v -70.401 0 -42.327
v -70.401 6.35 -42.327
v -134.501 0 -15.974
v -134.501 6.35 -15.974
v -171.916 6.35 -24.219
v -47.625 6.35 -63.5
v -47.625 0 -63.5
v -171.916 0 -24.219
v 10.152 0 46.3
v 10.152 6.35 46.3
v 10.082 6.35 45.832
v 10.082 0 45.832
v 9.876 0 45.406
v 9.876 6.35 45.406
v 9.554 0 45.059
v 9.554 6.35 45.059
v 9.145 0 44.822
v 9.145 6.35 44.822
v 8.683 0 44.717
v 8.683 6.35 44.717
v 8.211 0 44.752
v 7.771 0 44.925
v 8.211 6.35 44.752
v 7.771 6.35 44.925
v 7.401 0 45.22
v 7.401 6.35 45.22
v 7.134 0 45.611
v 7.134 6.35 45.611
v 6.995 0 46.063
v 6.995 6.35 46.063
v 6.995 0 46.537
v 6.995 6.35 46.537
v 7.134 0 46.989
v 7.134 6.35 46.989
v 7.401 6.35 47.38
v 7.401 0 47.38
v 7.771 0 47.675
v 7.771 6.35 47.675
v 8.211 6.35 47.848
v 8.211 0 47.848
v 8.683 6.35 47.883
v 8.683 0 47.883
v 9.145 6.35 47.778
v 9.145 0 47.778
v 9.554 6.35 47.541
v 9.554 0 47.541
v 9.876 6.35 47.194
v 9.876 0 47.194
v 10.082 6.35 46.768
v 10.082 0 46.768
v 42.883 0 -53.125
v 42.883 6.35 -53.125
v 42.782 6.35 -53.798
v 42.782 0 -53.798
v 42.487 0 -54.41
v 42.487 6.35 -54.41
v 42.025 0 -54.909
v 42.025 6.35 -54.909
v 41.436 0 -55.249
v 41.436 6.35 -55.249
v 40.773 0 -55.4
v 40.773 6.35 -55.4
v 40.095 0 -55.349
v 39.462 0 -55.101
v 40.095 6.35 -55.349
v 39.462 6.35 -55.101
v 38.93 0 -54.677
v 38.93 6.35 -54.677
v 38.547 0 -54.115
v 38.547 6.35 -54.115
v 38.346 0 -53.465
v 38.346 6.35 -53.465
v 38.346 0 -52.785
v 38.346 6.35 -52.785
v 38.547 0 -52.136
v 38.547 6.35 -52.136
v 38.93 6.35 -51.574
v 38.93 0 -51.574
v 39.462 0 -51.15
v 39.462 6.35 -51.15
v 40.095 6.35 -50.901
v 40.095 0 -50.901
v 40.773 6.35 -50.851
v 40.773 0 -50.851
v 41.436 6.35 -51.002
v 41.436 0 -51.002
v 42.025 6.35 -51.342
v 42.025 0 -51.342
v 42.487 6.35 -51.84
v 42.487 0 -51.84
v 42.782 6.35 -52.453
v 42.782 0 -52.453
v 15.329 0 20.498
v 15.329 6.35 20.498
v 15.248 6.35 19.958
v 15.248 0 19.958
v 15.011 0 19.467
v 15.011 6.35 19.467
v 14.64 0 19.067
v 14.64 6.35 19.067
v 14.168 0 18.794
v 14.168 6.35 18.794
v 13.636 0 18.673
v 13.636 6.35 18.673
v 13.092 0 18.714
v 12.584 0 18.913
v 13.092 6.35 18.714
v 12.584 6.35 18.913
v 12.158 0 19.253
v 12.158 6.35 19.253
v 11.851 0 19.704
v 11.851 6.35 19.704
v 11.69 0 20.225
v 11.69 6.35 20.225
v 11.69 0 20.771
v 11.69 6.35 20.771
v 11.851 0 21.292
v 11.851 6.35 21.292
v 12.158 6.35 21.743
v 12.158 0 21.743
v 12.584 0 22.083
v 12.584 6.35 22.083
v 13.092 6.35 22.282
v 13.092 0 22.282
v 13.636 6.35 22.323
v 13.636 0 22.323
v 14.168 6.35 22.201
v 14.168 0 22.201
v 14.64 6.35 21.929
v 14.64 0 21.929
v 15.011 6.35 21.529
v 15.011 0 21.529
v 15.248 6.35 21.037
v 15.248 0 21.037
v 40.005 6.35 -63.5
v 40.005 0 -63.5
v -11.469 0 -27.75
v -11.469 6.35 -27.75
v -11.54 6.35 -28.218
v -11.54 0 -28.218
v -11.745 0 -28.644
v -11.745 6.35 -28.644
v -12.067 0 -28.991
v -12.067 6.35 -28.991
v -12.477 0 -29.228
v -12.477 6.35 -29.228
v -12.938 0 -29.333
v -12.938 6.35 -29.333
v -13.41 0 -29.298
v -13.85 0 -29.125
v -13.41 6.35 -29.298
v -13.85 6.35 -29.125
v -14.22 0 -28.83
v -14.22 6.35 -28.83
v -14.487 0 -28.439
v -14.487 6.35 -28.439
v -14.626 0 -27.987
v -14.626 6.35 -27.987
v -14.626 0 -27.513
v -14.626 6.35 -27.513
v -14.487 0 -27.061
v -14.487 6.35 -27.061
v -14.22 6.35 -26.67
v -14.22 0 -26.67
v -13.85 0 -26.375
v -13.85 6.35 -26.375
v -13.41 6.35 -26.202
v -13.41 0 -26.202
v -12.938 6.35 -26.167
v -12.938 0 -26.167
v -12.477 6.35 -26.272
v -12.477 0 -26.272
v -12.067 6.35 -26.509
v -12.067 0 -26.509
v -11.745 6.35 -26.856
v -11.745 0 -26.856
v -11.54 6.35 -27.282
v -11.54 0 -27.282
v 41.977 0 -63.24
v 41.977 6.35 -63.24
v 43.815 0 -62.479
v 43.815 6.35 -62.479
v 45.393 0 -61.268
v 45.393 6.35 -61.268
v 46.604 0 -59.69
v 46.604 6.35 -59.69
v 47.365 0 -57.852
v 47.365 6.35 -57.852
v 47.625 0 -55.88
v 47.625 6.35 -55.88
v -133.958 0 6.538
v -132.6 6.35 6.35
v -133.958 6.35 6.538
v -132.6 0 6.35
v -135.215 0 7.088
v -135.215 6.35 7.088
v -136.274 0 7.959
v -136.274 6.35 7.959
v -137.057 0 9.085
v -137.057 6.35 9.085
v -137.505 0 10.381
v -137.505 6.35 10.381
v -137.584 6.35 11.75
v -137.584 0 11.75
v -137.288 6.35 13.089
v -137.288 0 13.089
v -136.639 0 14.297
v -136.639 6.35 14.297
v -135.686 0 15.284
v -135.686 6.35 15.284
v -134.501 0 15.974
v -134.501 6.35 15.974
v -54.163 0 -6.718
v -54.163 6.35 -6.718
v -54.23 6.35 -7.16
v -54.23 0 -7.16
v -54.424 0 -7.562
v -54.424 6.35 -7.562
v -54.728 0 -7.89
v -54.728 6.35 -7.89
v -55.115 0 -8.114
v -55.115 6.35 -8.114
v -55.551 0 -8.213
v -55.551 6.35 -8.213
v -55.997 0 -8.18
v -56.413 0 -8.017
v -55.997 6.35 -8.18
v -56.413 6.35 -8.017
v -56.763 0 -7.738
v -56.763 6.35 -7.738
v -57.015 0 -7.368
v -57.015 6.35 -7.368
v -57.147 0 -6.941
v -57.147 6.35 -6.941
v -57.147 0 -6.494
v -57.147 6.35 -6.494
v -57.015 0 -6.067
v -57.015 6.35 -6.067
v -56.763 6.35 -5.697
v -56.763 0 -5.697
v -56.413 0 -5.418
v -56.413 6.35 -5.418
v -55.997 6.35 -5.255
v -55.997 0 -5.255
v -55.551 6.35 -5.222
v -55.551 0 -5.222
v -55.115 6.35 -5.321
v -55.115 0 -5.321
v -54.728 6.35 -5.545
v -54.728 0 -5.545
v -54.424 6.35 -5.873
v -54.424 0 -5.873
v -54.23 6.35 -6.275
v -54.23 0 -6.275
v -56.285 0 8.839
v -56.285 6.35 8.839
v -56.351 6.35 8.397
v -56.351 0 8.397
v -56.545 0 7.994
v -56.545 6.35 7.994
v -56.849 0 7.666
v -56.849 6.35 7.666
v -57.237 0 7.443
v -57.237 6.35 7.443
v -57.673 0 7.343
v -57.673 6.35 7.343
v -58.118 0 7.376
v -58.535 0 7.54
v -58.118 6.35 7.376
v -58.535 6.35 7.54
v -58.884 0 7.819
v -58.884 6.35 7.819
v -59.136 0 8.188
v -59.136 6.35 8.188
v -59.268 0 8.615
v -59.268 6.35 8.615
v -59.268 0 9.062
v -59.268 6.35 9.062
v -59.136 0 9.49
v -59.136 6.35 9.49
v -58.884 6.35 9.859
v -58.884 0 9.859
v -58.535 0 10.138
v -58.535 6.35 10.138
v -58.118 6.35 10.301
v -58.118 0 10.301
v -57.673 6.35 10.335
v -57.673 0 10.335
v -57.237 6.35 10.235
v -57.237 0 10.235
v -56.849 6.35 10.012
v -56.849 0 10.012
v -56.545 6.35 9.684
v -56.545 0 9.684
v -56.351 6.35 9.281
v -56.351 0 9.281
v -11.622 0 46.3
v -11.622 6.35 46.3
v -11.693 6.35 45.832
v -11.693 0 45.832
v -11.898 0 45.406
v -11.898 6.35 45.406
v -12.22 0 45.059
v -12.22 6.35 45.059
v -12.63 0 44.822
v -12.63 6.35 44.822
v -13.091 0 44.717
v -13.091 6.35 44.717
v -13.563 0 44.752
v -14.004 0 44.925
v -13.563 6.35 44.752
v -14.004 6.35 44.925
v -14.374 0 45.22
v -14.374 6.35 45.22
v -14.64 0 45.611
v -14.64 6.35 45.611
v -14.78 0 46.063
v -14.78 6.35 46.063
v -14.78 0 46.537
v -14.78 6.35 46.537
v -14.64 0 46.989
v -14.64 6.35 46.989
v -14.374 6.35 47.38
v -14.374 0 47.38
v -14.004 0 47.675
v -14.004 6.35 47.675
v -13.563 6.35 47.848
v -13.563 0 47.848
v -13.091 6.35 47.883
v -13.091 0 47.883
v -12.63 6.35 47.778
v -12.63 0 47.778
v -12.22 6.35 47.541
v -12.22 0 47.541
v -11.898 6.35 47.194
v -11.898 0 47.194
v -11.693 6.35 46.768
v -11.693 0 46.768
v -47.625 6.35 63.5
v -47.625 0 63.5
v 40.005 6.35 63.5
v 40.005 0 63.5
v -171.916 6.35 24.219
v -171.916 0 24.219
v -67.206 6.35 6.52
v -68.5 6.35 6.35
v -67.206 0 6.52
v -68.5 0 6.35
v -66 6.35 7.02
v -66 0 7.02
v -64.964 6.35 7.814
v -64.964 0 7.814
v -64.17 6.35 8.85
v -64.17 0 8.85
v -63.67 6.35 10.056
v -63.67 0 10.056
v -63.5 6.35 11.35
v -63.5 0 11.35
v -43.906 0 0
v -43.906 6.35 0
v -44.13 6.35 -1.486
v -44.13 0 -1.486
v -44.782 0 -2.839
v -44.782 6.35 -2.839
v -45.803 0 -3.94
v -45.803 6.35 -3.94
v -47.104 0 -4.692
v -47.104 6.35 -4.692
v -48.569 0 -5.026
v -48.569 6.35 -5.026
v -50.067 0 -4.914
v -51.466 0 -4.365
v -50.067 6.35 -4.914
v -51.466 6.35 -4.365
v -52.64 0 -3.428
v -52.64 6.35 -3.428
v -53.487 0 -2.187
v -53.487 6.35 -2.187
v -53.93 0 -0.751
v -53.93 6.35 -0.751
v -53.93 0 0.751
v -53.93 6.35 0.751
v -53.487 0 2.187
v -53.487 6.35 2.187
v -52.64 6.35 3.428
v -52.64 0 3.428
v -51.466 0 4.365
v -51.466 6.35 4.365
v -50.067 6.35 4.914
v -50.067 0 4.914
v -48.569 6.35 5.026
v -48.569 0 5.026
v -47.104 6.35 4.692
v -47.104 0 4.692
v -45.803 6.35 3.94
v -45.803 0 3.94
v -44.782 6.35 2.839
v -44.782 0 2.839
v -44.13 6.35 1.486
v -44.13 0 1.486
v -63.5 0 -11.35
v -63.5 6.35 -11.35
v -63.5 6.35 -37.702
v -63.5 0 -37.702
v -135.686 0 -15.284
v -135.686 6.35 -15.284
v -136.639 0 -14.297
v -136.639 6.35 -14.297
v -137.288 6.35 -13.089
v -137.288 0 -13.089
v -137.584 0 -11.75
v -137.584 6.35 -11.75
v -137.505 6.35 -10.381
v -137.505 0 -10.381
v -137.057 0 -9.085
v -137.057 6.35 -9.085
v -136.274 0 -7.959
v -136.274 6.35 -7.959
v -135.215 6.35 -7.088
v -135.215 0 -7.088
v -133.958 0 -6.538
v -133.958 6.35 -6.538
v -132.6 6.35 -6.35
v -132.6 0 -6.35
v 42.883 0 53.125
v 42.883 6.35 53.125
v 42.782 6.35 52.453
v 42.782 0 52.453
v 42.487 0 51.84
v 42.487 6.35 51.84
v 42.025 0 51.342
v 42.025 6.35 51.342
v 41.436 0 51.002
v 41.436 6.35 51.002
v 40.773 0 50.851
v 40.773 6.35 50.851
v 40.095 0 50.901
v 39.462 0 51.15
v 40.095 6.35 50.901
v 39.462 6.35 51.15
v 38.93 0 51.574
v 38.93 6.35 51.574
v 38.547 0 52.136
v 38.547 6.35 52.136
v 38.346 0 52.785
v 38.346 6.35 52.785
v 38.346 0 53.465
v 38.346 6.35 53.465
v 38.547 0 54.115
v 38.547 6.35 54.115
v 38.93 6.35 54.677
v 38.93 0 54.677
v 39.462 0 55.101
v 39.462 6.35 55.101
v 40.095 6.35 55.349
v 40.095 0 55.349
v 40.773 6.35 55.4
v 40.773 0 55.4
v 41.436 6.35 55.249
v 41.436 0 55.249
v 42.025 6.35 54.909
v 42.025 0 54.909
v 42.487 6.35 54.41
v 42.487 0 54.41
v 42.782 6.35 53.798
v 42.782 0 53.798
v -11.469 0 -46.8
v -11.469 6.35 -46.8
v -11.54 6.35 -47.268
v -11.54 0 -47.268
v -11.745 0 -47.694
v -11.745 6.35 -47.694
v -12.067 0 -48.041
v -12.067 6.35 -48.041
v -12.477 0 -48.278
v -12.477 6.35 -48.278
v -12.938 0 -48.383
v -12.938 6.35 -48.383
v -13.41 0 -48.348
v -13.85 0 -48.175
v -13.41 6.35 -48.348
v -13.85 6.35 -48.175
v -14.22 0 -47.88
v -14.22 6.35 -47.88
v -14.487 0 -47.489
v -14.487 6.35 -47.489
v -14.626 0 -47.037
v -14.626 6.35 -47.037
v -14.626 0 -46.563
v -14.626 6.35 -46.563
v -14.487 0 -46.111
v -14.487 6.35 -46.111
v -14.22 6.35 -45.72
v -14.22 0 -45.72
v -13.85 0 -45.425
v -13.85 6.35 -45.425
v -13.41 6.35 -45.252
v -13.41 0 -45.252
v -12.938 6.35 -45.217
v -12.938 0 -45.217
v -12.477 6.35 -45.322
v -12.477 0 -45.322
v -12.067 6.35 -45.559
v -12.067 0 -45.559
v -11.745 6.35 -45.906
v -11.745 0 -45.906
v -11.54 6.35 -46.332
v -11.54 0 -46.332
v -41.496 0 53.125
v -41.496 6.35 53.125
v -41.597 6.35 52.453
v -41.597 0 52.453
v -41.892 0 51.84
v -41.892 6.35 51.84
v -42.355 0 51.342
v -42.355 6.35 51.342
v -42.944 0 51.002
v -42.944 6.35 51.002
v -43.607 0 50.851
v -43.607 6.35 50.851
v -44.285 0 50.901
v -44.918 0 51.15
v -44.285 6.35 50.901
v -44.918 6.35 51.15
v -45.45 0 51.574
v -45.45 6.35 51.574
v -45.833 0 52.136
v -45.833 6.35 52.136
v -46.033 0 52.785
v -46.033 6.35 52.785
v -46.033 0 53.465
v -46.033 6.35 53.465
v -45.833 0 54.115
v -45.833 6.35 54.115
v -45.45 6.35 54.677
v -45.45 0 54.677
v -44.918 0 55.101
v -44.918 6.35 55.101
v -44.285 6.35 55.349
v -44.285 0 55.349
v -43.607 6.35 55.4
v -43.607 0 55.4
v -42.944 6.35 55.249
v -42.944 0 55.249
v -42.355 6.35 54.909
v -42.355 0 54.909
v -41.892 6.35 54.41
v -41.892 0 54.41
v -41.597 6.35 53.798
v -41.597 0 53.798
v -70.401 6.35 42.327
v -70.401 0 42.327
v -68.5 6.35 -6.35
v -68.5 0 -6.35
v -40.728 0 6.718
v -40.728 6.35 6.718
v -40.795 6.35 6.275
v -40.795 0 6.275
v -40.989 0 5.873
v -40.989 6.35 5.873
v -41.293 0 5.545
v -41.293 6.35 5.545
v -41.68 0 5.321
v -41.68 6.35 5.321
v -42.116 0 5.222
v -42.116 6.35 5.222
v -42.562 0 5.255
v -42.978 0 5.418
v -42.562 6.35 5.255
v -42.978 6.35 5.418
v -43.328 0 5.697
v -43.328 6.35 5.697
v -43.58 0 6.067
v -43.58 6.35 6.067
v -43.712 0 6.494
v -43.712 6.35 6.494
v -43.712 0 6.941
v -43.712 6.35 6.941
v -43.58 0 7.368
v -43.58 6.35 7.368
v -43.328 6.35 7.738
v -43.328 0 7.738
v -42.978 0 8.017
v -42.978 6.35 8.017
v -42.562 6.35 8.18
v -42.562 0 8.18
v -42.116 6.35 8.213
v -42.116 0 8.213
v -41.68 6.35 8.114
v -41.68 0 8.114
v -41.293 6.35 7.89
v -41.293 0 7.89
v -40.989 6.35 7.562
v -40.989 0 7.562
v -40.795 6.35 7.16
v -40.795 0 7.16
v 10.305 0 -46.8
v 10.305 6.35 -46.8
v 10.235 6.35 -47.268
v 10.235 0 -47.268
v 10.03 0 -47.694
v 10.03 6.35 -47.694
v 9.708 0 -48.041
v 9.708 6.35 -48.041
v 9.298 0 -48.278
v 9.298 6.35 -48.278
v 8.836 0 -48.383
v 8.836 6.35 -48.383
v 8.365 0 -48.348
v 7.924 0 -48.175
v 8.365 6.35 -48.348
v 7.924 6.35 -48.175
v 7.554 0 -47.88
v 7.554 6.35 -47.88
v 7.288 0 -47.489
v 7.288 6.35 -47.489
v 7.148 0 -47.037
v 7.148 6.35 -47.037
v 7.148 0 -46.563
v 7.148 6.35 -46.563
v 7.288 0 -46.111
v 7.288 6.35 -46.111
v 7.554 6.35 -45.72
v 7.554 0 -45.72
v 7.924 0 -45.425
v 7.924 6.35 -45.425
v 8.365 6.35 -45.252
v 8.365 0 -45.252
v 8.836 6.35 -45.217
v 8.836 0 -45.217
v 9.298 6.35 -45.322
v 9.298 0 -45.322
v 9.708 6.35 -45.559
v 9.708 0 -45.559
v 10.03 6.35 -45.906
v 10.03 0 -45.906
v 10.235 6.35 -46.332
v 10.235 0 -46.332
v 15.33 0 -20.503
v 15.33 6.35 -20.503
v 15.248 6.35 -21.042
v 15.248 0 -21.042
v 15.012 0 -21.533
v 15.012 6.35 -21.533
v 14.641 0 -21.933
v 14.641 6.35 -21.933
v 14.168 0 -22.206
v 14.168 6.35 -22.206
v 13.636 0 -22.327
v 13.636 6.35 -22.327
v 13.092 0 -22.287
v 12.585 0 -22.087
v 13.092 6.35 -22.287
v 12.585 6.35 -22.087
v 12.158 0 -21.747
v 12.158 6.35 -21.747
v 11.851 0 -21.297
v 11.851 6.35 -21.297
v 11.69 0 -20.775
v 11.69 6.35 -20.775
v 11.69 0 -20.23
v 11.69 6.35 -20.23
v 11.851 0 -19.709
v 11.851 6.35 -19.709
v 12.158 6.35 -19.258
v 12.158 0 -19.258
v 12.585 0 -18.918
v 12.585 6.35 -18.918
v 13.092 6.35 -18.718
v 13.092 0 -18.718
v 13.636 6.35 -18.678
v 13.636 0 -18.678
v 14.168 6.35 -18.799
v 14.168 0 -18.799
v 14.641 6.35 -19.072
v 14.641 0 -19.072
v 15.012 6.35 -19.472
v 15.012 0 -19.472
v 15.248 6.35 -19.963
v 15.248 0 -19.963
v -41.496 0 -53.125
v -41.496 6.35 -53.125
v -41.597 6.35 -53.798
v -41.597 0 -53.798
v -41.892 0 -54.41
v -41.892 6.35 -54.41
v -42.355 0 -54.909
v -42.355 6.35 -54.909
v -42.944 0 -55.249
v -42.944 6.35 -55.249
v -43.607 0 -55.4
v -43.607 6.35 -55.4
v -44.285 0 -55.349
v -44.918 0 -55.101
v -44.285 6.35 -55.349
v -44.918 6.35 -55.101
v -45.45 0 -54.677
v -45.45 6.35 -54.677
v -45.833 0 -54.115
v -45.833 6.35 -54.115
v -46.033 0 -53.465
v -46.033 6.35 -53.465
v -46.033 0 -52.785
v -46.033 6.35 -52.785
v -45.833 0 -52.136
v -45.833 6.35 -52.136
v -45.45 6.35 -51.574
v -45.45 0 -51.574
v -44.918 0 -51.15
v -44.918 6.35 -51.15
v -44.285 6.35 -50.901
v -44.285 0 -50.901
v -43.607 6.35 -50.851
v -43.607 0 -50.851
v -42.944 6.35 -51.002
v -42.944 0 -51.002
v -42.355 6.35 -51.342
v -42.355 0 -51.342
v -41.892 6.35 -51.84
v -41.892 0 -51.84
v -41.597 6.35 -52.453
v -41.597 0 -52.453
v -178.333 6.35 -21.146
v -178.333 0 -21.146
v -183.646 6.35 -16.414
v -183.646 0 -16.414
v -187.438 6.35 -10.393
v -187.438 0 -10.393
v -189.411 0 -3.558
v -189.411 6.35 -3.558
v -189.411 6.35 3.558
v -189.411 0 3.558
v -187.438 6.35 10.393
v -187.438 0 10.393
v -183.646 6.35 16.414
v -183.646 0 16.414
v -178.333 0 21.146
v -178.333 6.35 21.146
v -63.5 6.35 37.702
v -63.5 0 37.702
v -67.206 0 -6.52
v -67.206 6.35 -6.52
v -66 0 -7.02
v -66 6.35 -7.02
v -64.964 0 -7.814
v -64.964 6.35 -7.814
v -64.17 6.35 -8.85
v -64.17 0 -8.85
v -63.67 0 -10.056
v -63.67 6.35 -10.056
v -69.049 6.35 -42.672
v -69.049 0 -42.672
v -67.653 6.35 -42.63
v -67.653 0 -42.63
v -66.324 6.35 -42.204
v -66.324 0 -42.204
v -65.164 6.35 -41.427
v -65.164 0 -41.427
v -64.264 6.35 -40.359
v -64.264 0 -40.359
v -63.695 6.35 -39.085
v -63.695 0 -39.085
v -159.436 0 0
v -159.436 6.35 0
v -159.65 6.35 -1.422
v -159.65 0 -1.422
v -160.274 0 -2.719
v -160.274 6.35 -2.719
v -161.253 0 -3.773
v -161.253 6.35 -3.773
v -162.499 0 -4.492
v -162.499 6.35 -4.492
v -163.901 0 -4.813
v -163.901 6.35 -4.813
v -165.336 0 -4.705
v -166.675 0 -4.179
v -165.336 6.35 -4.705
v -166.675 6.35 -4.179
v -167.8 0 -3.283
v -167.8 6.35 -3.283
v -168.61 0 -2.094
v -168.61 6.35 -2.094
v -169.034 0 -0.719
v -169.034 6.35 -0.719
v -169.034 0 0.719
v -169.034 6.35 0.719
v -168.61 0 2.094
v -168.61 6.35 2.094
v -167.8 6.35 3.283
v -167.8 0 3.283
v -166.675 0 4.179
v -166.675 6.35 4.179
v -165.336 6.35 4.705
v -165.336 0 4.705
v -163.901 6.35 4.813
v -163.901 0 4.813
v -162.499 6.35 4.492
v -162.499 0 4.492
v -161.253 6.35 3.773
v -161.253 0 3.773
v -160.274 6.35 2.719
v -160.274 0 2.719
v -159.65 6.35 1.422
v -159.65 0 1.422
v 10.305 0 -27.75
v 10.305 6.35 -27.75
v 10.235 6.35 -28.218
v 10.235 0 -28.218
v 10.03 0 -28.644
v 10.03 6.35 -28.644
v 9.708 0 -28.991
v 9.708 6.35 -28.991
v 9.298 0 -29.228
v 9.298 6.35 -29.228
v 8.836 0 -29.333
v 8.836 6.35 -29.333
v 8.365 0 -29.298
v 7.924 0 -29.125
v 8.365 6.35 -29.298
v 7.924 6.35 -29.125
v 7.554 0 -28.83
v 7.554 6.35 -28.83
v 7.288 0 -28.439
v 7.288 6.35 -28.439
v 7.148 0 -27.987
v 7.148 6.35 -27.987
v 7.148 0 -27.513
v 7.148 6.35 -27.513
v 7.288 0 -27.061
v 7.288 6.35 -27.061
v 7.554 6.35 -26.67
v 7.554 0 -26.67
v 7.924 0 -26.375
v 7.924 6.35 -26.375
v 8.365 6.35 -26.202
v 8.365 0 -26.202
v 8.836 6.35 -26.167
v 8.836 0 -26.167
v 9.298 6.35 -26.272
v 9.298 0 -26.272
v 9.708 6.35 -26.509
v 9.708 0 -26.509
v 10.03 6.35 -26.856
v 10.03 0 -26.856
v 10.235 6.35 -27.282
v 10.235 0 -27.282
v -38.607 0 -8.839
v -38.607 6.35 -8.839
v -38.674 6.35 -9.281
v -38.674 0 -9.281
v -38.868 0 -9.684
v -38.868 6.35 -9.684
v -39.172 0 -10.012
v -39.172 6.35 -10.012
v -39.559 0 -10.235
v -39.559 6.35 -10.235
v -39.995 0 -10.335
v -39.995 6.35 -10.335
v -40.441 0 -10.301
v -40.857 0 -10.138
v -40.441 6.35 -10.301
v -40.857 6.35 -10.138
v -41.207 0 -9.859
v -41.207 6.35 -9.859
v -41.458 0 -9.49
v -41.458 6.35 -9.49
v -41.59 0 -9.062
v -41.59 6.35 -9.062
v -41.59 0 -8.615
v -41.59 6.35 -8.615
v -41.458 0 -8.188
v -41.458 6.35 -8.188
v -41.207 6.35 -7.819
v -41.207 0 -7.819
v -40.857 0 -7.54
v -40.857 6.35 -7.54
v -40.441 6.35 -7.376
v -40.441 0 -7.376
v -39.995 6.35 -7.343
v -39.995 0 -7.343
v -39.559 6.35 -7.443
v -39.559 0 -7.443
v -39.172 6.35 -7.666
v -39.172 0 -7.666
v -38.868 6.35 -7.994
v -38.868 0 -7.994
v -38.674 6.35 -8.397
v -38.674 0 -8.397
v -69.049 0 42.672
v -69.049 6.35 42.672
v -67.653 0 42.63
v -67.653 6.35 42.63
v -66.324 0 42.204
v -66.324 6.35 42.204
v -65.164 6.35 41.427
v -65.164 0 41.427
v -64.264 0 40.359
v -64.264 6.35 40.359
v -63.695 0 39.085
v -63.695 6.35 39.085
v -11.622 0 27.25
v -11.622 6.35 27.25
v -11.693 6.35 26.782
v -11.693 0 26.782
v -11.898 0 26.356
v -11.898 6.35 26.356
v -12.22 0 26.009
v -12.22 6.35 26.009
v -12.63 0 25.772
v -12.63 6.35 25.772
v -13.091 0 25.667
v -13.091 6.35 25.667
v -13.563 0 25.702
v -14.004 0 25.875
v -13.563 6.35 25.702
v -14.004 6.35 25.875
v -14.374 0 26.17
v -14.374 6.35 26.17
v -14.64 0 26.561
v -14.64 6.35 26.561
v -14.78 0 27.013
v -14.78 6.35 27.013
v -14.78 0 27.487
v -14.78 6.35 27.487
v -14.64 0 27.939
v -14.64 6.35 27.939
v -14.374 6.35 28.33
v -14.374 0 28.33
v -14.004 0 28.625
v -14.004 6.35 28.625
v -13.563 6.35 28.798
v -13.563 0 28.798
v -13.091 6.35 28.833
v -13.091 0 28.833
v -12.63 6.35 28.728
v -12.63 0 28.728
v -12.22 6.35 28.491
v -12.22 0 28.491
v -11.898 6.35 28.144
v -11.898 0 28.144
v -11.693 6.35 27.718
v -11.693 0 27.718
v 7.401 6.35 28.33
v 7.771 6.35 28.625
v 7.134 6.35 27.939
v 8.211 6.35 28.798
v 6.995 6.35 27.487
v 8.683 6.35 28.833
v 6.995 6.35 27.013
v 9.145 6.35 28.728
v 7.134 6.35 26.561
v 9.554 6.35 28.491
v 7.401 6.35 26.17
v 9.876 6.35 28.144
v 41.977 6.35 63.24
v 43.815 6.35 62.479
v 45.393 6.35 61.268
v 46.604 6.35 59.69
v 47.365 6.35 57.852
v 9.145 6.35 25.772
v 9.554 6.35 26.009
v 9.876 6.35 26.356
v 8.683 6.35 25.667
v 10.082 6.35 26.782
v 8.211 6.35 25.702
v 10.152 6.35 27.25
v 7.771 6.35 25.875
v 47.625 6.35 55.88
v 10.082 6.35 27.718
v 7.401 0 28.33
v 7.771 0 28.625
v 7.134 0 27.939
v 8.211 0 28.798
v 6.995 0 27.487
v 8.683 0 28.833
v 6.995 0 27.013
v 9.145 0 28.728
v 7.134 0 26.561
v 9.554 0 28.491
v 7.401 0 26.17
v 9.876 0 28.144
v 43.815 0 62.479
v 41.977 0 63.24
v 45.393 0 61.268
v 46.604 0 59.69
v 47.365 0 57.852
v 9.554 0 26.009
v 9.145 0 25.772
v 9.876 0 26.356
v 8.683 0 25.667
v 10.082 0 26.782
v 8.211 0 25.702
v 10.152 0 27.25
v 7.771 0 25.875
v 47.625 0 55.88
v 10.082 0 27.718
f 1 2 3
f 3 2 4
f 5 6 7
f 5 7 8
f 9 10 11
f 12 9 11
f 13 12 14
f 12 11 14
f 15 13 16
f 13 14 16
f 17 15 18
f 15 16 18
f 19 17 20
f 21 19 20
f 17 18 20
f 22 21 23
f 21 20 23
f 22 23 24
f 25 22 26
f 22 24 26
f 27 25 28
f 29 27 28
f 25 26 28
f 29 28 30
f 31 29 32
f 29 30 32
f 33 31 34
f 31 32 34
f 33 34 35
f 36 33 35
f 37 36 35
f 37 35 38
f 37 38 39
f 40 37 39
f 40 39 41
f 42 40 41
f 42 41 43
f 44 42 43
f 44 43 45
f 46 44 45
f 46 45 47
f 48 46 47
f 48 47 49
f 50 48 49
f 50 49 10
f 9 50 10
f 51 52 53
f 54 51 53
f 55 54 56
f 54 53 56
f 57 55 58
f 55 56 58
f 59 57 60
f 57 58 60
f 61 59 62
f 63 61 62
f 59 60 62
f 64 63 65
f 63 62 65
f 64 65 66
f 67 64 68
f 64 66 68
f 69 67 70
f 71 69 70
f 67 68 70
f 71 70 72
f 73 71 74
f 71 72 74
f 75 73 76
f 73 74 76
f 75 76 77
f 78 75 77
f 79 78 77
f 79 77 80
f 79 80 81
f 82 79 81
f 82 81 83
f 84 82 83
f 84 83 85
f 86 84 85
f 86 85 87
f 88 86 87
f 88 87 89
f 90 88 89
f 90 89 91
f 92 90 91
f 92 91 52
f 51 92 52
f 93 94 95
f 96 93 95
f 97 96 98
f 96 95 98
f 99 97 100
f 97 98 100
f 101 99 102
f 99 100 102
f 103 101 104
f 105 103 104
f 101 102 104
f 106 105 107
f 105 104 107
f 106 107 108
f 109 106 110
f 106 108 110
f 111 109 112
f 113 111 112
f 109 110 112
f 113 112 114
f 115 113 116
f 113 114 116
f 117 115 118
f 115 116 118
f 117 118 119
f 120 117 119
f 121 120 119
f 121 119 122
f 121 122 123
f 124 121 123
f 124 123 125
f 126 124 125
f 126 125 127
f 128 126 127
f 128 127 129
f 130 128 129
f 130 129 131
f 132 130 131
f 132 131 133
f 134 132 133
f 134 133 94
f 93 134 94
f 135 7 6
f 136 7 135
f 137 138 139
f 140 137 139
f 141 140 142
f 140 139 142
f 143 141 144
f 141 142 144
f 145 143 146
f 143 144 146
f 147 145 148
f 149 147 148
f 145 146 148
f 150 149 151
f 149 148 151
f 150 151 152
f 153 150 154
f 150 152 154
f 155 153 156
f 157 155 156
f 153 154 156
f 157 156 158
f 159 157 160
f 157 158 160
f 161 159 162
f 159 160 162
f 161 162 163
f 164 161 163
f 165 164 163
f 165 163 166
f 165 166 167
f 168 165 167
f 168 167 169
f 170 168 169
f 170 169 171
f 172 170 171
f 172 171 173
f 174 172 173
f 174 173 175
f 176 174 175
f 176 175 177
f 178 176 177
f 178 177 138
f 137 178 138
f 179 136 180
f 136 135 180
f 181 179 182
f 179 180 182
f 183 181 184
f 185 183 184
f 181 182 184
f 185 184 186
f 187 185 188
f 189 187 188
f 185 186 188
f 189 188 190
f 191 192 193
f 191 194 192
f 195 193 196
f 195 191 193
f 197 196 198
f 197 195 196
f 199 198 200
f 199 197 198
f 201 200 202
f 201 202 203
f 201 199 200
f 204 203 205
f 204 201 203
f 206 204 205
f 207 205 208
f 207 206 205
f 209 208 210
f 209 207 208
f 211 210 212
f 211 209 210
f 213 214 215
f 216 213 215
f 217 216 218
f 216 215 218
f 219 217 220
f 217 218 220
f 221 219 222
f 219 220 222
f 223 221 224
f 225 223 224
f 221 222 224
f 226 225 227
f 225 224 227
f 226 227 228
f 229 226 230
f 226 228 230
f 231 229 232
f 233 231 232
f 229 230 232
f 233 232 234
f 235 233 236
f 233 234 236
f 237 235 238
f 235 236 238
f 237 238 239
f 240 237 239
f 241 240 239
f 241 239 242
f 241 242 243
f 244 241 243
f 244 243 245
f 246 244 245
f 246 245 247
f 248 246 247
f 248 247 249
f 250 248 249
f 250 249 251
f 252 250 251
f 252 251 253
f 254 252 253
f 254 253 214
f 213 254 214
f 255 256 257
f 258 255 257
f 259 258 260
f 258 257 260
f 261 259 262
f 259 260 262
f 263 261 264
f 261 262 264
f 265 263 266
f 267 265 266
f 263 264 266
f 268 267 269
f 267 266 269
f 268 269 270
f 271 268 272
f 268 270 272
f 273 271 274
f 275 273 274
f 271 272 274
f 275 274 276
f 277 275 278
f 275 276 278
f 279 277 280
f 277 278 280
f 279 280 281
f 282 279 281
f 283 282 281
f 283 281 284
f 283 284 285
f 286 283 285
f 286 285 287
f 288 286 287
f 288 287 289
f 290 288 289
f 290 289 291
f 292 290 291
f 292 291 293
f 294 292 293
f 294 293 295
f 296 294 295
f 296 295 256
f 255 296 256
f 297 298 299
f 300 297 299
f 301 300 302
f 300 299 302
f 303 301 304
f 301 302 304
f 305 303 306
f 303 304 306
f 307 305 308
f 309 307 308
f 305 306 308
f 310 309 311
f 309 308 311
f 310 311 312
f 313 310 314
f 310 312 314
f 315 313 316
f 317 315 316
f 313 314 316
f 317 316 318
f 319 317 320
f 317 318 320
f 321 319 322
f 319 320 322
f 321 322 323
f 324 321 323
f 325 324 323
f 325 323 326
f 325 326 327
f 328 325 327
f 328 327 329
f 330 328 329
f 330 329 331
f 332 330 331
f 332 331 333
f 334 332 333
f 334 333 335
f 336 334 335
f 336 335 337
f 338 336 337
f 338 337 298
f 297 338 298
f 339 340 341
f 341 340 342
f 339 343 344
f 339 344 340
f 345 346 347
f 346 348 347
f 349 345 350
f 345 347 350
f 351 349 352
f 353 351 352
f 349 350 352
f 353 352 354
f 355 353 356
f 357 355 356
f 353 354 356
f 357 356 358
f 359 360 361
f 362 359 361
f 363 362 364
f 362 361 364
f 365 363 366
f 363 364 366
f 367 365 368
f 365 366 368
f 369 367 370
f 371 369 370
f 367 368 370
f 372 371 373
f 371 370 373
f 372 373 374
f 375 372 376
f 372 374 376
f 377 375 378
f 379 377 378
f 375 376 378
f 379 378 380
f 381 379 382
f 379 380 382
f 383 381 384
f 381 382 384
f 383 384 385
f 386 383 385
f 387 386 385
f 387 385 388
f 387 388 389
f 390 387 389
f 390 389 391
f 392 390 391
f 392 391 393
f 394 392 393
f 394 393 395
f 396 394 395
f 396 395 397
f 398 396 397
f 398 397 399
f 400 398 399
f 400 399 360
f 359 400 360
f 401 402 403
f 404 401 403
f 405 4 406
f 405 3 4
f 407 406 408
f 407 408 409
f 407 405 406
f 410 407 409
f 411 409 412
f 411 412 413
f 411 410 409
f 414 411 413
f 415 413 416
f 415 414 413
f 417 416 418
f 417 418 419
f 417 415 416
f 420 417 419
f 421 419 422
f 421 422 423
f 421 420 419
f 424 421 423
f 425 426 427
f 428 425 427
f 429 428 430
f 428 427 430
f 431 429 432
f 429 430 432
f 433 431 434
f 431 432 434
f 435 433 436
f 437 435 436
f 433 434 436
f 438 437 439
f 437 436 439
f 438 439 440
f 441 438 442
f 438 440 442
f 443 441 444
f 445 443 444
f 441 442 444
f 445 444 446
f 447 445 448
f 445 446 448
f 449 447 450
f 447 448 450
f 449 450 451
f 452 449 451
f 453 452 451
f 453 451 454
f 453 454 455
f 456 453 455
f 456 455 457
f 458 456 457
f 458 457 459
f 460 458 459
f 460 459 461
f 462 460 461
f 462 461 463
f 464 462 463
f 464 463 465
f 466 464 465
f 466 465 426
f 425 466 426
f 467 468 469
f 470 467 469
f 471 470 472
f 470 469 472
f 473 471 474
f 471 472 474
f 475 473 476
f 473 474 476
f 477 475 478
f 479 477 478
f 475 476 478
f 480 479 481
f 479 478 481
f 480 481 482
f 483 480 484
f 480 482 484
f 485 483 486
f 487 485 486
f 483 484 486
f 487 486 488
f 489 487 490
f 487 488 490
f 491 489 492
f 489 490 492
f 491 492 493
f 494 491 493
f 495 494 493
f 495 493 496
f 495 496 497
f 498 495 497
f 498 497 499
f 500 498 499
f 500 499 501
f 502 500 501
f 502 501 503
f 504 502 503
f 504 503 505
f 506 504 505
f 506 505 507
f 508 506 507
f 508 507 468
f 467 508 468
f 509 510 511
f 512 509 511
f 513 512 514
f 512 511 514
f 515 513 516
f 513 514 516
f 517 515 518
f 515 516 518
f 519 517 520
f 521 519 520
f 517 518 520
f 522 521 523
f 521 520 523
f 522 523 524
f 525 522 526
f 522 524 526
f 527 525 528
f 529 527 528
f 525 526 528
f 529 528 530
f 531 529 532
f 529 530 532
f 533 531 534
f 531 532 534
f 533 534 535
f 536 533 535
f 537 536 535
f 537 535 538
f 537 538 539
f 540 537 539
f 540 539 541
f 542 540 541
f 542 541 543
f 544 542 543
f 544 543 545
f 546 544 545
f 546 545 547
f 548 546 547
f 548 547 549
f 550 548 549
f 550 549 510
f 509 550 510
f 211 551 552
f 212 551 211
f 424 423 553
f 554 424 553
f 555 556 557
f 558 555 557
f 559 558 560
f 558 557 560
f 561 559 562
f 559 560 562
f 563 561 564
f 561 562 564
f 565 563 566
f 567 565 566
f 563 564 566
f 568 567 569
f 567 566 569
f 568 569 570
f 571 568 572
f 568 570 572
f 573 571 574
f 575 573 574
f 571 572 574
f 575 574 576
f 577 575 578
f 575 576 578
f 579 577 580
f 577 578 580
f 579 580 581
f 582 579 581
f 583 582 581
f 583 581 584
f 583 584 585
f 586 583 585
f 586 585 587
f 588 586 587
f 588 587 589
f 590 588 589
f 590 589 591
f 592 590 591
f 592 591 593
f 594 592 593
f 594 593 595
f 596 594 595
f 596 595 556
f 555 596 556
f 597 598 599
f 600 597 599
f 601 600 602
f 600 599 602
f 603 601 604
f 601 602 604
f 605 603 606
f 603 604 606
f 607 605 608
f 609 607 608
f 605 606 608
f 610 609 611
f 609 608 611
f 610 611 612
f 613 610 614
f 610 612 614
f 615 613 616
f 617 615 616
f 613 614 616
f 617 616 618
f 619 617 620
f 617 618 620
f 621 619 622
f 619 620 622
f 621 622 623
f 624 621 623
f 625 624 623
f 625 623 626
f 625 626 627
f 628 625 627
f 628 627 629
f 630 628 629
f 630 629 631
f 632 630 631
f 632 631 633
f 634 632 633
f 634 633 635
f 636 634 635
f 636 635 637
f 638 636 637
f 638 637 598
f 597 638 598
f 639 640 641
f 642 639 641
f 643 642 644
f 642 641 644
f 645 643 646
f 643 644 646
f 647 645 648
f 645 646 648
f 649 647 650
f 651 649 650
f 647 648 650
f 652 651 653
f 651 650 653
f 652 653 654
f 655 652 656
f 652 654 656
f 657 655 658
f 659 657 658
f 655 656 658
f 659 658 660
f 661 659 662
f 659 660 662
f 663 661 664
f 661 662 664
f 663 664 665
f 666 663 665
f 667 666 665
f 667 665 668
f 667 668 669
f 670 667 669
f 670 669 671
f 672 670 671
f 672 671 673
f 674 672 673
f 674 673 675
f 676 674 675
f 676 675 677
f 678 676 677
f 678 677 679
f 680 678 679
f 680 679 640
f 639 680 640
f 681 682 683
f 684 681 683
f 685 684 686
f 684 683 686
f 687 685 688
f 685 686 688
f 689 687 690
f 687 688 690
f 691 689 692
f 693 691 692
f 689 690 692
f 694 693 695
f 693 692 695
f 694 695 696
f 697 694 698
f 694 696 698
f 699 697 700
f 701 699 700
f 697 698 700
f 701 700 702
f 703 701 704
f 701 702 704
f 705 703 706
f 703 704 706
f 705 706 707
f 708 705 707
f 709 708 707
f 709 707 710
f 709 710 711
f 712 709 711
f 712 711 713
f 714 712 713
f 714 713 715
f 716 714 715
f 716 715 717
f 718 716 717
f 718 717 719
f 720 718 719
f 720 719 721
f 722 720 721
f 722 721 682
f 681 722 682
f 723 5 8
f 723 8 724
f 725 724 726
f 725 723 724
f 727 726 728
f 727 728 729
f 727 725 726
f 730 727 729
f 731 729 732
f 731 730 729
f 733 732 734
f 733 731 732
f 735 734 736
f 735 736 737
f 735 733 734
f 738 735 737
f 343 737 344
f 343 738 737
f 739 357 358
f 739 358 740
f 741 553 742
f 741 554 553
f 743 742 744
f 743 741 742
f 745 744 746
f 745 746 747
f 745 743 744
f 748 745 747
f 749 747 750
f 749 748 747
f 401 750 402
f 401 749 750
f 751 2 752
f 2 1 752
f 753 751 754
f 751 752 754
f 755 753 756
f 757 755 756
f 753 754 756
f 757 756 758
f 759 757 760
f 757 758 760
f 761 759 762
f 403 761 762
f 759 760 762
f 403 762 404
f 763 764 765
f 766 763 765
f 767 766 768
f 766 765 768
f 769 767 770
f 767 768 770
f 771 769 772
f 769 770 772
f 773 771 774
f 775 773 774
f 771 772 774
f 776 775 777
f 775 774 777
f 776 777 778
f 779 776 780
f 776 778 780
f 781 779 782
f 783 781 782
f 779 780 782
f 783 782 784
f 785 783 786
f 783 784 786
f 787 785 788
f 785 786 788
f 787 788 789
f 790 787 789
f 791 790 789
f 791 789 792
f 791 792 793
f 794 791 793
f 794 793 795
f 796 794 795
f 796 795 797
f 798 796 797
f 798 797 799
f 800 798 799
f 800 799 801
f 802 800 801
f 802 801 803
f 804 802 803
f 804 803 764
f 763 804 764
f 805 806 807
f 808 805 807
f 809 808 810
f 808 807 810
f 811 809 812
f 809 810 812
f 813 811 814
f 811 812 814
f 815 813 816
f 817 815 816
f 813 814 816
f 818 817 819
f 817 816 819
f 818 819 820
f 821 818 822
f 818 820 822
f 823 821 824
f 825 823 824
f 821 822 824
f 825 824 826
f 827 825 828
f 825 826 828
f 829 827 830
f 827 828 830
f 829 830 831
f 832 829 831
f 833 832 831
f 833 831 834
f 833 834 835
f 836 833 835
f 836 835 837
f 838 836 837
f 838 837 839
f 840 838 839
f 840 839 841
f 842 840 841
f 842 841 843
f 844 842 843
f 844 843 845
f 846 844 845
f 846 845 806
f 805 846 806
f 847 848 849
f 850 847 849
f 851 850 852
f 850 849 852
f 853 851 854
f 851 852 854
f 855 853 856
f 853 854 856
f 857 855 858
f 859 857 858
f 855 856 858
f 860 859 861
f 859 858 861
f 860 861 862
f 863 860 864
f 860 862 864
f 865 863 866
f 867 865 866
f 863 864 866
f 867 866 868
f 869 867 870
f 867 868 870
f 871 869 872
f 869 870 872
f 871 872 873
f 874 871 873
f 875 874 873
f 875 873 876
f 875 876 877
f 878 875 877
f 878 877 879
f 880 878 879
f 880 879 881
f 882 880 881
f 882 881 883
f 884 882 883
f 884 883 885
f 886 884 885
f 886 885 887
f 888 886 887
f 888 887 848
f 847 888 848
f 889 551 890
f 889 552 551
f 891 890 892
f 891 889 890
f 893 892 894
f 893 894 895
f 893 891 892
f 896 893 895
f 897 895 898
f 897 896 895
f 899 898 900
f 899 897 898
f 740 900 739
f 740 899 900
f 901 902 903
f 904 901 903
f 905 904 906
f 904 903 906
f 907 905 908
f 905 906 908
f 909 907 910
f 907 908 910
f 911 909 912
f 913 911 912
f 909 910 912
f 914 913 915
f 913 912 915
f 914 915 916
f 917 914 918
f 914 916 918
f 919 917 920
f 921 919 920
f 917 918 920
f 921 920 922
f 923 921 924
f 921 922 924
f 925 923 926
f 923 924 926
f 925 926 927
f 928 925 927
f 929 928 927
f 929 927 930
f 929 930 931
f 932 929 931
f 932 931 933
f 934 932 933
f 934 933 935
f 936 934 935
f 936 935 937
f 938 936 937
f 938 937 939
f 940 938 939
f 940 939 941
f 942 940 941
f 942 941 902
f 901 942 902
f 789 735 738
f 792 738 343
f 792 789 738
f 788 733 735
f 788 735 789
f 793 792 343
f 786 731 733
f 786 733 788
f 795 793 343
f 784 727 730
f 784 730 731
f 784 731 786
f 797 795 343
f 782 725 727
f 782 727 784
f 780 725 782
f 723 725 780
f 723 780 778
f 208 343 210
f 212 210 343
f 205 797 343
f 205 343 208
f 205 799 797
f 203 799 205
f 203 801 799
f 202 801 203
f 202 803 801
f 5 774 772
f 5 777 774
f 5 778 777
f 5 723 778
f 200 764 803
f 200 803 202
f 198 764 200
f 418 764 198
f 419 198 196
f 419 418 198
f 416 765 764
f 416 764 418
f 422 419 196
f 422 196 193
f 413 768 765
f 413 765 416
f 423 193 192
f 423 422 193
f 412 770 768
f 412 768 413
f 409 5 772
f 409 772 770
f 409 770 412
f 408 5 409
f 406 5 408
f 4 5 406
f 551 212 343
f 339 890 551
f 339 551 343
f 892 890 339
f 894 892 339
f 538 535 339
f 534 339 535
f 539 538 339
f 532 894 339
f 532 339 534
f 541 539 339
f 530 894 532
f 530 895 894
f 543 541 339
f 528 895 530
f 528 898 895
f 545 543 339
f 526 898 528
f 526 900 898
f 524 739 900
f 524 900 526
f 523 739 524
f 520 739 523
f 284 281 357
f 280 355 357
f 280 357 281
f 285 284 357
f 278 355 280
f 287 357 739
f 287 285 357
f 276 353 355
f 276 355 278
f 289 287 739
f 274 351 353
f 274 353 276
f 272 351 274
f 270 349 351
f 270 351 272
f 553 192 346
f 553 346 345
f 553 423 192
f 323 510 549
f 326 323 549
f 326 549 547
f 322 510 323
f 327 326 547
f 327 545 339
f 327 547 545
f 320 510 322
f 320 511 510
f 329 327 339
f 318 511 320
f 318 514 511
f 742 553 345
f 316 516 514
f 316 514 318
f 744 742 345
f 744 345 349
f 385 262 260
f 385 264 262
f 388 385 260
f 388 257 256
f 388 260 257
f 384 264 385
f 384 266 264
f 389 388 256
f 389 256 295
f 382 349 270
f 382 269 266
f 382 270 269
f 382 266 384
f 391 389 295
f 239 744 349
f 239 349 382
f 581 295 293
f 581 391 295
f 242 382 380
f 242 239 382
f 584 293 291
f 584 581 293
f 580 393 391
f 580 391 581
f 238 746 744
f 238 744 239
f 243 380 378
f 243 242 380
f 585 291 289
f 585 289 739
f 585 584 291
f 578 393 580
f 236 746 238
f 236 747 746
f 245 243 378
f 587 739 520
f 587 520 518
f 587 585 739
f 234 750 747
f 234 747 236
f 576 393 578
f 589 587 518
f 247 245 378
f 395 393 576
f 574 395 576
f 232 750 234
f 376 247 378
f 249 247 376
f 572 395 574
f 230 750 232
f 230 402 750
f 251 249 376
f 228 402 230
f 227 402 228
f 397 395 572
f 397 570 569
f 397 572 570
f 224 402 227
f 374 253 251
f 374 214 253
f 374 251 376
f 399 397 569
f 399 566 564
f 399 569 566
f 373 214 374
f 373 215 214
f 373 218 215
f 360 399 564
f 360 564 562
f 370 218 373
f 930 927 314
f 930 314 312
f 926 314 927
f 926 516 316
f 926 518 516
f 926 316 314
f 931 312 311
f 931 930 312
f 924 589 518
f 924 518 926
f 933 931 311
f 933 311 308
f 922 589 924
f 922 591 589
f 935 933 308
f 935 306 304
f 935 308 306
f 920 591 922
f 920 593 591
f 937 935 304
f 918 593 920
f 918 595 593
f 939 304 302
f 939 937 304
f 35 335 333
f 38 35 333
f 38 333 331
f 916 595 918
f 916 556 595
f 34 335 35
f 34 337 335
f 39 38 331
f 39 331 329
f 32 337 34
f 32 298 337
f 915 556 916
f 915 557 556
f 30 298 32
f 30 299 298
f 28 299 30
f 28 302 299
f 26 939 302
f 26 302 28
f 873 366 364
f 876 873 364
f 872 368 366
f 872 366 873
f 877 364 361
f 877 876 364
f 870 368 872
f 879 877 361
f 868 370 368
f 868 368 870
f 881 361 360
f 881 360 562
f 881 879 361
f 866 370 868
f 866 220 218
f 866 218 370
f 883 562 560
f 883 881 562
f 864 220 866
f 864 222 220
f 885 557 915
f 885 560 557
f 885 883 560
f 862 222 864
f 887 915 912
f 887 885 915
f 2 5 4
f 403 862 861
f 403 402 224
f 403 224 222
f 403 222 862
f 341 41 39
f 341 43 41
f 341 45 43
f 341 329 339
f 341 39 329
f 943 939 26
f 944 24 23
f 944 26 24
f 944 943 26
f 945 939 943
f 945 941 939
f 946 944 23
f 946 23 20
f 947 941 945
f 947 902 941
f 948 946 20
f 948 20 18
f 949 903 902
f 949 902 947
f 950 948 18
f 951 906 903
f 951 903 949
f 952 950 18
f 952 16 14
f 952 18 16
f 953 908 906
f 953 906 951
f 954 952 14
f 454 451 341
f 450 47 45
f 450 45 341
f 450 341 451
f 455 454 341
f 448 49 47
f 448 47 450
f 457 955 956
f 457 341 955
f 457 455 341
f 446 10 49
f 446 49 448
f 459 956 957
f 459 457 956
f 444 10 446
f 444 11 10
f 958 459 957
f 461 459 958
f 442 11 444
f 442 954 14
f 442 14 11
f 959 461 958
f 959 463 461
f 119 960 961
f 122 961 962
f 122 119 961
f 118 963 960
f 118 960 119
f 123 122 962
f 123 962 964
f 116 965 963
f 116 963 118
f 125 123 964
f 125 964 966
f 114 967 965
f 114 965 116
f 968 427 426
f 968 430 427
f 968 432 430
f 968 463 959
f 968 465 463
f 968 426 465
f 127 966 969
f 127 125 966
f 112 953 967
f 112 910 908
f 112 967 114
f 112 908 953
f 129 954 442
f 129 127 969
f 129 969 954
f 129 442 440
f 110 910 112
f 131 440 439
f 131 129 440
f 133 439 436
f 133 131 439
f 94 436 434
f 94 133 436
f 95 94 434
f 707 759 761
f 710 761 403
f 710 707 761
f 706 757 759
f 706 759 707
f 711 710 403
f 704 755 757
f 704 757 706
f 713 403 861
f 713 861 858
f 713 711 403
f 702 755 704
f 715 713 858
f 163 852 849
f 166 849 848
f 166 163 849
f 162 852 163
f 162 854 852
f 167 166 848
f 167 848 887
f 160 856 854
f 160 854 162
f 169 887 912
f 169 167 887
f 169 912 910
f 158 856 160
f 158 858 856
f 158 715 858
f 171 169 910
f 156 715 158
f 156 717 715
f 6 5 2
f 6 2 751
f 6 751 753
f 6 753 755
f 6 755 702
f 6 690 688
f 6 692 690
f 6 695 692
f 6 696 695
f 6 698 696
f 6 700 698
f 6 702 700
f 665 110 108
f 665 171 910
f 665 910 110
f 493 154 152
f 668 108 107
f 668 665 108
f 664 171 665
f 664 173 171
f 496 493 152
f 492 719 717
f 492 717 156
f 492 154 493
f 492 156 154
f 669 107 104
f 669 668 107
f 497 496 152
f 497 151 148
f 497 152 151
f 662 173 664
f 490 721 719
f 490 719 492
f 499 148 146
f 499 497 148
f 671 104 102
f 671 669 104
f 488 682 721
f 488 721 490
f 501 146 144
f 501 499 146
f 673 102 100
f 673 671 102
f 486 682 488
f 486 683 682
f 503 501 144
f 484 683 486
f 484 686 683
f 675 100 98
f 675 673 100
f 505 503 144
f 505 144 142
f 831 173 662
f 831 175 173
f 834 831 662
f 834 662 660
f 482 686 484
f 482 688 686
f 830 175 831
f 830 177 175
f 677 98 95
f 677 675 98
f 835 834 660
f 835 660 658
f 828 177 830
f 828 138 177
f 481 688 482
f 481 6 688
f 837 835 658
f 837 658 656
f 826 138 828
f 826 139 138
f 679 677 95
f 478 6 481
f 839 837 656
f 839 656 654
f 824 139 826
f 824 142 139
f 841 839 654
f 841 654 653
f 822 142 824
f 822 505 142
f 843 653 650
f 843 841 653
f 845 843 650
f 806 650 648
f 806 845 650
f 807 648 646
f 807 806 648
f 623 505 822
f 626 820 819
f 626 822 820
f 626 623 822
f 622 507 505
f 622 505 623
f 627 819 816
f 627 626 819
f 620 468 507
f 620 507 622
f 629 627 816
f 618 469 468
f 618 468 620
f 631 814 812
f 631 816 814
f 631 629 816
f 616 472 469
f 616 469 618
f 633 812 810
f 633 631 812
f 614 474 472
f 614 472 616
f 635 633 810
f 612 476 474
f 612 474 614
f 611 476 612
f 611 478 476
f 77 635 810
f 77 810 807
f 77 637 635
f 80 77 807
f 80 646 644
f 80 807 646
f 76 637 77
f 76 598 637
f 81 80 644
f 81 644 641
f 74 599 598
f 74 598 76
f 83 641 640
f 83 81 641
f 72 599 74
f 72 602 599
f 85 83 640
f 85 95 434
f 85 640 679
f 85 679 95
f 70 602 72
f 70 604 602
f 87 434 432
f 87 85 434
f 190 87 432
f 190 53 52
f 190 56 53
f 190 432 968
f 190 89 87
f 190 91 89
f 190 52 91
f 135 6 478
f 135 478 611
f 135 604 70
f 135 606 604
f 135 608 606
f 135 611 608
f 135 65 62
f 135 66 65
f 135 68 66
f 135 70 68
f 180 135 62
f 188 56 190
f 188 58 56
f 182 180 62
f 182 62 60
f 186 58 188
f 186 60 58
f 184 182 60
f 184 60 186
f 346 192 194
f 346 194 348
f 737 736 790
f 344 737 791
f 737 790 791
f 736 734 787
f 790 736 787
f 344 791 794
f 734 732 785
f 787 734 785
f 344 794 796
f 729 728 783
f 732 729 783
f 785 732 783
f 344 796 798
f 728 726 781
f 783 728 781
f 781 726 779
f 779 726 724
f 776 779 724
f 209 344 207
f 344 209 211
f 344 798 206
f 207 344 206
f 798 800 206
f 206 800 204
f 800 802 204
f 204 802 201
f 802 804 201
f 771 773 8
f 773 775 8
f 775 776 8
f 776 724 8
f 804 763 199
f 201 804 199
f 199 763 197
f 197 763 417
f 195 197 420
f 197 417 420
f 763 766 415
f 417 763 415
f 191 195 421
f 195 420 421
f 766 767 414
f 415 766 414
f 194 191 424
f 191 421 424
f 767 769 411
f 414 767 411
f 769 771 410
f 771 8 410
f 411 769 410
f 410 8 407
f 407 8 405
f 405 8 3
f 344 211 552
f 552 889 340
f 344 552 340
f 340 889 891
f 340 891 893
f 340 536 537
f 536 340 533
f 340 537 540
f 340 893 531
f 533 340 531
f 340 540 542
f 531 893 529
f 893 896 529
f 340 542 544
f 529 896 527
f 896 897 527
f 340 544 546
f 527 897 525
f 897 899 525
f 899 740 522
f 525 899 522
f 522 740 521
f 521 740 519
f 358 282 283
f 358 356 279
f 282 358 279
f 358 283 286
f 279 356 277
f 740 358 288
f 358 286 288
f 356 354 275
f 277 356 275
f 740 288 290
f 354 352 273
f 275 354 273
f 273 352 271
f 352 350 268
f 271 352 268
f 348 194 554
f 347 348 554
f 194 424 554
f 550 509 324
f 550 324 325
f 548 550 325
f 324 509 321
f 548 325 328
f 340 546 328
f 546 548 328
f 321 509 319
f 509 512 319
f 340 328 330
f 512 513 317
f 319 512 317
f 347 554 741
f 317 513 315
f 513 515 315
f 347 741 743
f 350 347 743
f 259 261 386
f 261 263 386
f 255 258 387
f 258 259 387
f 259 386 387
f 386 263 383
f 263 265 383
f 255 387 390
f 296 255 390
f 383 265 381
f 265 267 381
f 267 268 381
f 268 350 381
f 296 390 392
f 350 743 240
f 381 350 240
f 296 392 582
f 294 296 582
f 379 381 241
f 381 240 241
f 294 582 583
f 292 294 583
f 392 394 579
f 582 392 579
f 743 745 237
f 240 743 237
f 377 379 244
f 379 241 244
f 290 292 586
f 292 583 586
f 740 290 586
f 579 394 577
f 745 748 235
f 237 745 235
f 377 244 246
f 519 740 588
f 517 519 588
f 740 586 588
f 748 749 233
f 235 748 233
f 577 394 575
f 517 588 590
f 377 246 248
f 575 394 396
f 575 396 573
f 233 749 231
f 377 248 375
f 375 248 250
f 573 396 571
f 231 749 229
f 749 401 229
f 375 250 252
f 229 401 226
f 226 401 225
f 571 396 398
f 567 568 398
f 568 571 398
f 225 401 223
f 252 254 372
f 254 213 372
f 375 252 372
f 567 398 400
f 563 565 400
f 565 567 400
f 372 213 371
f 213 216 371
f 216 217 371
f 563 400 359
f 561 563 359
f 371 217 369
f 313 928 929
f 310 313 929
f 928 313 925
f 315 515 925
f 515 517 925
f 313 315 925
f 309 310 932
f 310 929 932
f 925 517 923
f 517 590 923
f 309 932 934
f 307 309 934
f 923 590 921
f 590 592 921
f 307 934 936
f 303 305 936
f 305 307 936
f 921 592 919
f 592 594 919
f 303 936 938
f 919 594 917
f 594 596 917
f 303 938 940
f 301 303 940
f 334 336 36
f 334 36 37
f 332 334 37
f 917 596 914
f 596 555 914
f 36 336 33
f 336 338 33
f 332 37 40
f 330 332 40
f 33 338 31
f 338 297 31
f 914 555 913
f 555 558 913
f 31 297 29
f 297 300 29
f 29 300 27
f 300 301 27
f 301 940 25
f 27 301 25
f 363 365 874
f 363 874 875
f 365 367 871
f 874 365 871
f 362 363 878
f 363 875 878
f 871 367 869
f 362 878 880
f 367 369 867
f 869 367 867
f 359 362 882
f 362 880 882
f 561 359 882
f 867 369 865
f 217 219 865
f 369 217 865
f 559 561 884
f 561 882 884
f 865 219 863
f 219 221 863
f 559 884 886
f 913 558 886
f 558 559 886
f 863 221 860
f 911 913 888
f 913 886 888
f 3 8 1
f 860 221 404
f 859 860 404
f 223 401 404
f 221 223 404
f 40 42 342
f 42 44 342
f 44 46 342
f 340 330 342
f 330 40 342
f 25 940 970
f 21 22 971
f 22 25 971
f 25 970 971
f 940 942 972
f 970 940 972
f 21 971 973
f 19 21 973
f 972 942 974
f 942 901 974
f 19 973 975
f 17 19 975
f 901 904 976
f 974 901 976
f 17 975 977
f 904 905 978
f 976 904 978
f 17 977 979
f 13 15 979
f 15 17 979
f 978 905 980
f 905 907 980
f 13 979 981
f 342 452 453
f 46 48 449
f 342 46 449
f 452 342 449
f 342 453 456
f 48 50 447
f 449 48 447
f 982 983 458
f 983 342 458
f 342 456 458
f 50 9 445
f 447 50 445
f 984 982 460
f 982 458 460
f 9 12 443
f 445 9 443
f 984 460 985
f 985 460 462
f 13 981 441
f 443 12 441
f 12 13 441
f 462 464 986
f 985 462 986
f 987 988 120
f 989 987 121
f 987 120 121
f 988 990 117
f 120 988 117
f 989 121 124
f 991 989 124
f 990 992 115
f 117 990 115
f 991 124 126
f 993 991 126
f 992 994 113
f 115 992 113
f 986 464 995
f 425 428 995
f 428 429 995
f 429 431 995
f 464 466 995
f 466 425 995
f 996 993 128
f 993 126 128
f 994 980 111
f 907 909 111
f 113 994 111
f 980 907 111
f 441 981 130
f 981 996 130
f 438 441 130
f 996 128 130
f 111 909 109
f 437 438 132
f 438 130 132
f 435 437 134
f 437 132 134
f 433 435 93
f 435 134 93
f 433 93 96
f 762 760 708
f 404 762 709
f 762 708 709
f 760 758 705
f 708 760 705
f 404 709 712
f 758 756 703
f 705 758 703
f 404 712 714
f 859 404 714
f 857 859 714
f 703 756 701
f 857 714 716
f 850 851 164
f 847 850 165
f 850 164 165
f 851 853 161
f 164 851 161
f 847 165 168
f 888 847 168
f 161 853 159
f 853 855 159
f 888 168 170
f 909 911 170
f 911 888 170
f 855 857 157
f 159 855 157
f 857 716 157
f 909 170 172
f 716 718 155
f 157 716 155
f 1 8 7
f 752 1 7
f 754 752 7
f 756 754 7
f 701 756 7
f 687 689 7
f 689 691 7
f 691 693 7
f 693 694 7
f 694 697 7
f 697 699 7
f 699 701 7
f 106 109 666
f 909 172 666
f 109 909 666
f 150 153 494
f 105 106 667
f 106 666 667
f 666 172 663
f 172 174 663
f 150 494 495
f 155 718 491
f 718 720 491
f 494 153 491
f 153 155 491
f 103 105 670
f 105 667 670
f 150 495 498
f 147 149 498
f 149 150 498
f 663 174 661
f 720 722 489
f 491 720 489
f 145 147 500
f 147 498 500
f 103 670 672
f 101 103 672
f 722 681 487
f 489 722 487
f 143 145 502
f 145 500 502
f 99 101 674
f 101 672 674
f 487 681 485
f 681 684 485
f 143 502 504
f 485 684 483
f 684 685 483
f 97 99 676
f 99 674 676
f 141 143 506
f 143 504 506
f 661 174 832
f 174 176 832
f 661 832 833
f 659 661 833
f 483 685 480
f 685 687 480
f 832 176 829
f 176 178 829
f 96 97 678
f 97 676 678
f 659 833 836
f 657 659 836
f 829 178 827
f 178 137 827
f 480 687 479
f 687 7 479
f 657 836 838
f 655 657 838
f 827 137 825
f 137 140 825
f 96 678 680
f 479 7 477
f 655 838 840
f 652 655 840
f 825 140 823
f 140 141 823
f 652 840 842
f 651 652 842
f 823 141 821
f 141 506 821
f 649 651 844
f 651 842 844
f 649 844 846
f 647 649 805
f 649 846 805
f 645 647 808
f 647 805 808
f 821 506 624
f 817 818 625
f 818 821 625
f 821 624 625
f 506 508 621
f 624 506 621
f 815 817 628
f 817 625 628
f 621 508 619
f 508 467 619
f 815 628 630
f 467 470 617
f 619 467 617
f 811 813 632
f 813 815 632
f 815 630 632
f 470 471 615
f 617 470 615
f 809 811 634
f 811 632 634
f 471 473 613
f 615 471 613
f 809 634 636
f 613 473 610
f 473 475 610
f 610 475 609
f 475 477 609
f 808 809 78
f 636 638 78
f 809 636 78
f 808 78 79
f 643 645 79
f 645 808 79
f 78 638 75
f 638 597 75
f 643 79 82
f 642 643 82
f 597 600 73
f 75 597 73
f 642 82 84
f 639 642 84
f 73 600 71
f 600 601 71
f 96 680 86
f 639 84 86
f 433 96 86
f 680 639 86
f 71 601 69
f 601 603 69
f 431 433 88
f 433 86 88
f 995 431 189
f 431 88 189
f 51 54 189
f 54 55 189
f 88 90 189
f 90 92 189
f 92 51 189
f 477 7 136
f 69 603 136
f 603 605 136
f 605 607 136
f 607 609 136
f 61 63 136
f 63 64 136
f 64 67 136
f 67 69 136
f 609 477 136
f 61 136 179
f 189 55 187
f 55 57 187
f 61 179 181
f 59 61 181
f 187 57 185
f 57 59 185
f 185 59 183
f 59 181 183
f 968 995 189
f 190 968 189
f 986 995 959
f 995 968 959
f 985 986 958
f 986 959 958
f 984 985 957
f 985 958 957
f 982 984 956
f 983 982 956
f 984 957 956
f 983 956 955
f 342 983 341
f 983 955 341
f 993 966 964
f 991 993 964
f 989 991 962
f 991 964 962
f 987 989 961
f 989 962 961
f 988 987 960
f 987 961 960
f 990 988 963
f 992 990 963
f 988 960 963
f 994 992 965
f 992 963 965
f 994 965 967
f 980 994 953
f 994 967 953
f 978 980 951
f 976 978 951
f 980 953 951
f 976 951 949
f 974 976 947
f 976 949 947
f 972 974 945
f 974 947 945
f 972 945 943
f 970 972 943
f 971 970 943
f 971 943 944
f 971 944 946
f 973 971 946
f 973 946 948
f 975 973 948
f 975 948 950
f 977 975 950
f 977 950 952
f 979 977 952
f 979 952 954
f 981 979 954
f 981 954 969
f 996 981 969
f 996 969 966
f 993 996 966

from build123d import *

# Parameters (mm, degrees)
SKETCH1_W           = 95.25
SKETCH1_H           = 127
BOSS_EXTRUDE1_DEPTH = 6.35
BOSS_EXTRUDE3_DEPTH = 6.35
SKETCH5_R           = 4.826
SKETCH5_R_2         = 5.039999953
SKETCH5_R_3         = 1.5
CUT_EXTRUDE1_DEPTH  = 7.35
CUT_EXTRUDE2_DEPTH  = 7.35
FILLET9_R           = 5
FILLET10_R          = 7.62
SKETCH7_R           = 2.2812375
CUT_EXTRUDE3_DEPTH  = 7.35
SKETCH8_R           = 1.5875
CUT_EXTRUDE4_DEPTH  = 7.35
SKETCH9_R           = 1.830008083
CUT_EXTRUDE5_DEPTH  = 7.35


with BuildPart() as part:
    # Sketch1 → Boss-Extrude1 (new body)
    with BuildSketch(Plane(origin=(0, 0, 0), x_dir=(1, 0, 0), z_dir=(0, 1, 0))):
        Rectangle(SKETCH1_W, SKETCH1_H)
    extrude(amount=BOSS_EXTRUDE1_DEPTH)

    # Sketch4 → Boss-Extrude3 (add)
    with BuildSketch(Plane(origin=(0, 6.35, 0), x_dir=(1, 0, 0), z_dir=(0, 1, 0))):
        with BuildLine():
            Line((-47.625, 63.5), (-171.916018217, 24.219268021))
            ThreePointArc((-171.916018217, 24.219268021), (-189.6618, 0), (-171.916018217, -24.219268021))
            Line((-171.916018217, -24.219268021), (-47.625, -63.5))
            Line((-47.625, -63.5), (-47.625, 63.5))
        make_face()
    extrude(amount=-BOSS_EXTRUDE3_DEPTH)

    # Sketch5 → Cut-Extrude1 (cut, through all)
    with BuildSketch(Plane(origin=(0, 6.35, 0), x_dir=(1, 0, 0), z_dir=(0, 1, 0))):
        with Locations((-164.2618, 0)):
            Circle(SKETCH5_R)
        with Locations((-48.9458, 0)):
            Circle(SKETCH5_R_2)
        with Locations((-40.106965235, 8.838834765)):
            Circle(SKETCH5_R_3)
        with Locations((-57.784634765, -8.838834765)):
            Circle(SKETCH5_R_3)
        with Locations((-55.663314421, 6.717514421)):
            Circle(SKETCH5_R_3)
        with Locations((-42.228285579, -6.717514421)):
            Circle(SKETCH5_R_3)
    extrude(amount=-CUT_EXTRUDE1_DEPTH, mode=Mode.SUBTRACT)

    # Sketch6 → Cut-Extrude2 (cut, through all)
    with BuildSketch(Plane(origin=(0, 6.35, 0), x_dir=(1, 0, 0), z_dir=(0, 1, 0))):
        Polygon((-63.5, 45.163743355), (-157.9118, 6.35), (-63.5, 6.35), align=None)
        Polygon((-63.5, -6.35), (-63.5, -45.163743355), (-157.9118, -6.35), align=None)
    extrude(amount=-CUT_EXTRUDE2_DEPTH, mode=Mode.SUBTRACT)

    # Fillet9
    fillet9_edges = [part.edges().sort_by_distance(p)[0] for p in [
        (-63.5, 3.175, -45.163743355),
        (-63.5, 3.175, -6.35),
        (-157.9118, 3.175, -6.35),
        (-157.9118, 3.175, 6.35),
        (-63.5, 3.175, 6.35),
        (-63.5, 3.175, 45.163743355),
    ]]
    fillet(fillet9_edges, radius=FILLET9_R)

    # Fillet10
    fillet10_edges = [part.edges().sort_by_distance(p)[0] for p in [
        (47.625, 3.175, 63.5),
        (47.625, 3.175, -63.5),
    ]]
    fillet(fillet10_edges, radius=FILLET10_R)

    # Sketch7 → Cut-Extrude3 (cut, through all)
    with BuildSketch(Plane(origin=(0, 6.35, 0), x_dir=(1, 0, 0), z_dir=(0, 1, 0))):
        with Locations((-43.777254611, -53.125383493)):
            Circle(SKETCH7_R)
        with Locations((-43.777254611, 53.125383493)):
            Circle(SKETCH7_R)
        with Locations((40.602254611, 53.125383493)):
            Circle(SKETCH7_R)
        with Locations((40.602254611, -53.125383493)):
            Circle(SKETCH7_R)
    extrude(amount=-CUT_EXTRUDE3_DEPTH, mode=Mode.SUBTRACT)

    # Sketch8 → Cut-Extrude4 (cut, through all)
    with BuildSketch(Plane(origin=(0, 6.35, 0), x_dir=(1, 0, 0), z_dir=(0, 1, 0))):
        with Locations((-13.209796215, -27.25)):
            Circle(SKETCH8_R)
        with Locations((8.564628211, -27.25)):
            Circle(SKETCH8_R)
        with Locations((8.564628211, -46.3)):
            Circle(SKETCH8_R)
        with Locations((-13.209796215, -46.3)):
            Circle(SKETCH8_R)
        with Locations((8.717854945, 46.8)):
            Circle(SKETCH8_R)
        with Locations((-13.056569481, 27.75)):
            Circle(SKETCH8_R)
        with Locations((-13.056569481, 46.8)):
            Circle(SKETCH8_R)
        with Locations((8.717854945, 27.75)):
            Circle(SKETCH8_R)
    extrude(amount=-CUT_EXTRUDE4_DEPTH, mode=Mode.SUBTRACT)

    # Sketch9 → Cut-Extrude5 (cut, through all)
    with BuildSketch(Plane(origin=(0, 6.35, 0), x_dir=(1, 0, 0), z_dir=(0, 1, 0))):
        with Locations((13.499388849, -20.49783886)):
            Circle(SKETCH9_R)
        with Locations((13.49951585, 20.502576943)):
            Circle(SKETCH9_R)
    extrude(amount=-CUT_EXTRUDE5_DEPTH, mode=Mode.SUBTRACT)


solid = part.part
